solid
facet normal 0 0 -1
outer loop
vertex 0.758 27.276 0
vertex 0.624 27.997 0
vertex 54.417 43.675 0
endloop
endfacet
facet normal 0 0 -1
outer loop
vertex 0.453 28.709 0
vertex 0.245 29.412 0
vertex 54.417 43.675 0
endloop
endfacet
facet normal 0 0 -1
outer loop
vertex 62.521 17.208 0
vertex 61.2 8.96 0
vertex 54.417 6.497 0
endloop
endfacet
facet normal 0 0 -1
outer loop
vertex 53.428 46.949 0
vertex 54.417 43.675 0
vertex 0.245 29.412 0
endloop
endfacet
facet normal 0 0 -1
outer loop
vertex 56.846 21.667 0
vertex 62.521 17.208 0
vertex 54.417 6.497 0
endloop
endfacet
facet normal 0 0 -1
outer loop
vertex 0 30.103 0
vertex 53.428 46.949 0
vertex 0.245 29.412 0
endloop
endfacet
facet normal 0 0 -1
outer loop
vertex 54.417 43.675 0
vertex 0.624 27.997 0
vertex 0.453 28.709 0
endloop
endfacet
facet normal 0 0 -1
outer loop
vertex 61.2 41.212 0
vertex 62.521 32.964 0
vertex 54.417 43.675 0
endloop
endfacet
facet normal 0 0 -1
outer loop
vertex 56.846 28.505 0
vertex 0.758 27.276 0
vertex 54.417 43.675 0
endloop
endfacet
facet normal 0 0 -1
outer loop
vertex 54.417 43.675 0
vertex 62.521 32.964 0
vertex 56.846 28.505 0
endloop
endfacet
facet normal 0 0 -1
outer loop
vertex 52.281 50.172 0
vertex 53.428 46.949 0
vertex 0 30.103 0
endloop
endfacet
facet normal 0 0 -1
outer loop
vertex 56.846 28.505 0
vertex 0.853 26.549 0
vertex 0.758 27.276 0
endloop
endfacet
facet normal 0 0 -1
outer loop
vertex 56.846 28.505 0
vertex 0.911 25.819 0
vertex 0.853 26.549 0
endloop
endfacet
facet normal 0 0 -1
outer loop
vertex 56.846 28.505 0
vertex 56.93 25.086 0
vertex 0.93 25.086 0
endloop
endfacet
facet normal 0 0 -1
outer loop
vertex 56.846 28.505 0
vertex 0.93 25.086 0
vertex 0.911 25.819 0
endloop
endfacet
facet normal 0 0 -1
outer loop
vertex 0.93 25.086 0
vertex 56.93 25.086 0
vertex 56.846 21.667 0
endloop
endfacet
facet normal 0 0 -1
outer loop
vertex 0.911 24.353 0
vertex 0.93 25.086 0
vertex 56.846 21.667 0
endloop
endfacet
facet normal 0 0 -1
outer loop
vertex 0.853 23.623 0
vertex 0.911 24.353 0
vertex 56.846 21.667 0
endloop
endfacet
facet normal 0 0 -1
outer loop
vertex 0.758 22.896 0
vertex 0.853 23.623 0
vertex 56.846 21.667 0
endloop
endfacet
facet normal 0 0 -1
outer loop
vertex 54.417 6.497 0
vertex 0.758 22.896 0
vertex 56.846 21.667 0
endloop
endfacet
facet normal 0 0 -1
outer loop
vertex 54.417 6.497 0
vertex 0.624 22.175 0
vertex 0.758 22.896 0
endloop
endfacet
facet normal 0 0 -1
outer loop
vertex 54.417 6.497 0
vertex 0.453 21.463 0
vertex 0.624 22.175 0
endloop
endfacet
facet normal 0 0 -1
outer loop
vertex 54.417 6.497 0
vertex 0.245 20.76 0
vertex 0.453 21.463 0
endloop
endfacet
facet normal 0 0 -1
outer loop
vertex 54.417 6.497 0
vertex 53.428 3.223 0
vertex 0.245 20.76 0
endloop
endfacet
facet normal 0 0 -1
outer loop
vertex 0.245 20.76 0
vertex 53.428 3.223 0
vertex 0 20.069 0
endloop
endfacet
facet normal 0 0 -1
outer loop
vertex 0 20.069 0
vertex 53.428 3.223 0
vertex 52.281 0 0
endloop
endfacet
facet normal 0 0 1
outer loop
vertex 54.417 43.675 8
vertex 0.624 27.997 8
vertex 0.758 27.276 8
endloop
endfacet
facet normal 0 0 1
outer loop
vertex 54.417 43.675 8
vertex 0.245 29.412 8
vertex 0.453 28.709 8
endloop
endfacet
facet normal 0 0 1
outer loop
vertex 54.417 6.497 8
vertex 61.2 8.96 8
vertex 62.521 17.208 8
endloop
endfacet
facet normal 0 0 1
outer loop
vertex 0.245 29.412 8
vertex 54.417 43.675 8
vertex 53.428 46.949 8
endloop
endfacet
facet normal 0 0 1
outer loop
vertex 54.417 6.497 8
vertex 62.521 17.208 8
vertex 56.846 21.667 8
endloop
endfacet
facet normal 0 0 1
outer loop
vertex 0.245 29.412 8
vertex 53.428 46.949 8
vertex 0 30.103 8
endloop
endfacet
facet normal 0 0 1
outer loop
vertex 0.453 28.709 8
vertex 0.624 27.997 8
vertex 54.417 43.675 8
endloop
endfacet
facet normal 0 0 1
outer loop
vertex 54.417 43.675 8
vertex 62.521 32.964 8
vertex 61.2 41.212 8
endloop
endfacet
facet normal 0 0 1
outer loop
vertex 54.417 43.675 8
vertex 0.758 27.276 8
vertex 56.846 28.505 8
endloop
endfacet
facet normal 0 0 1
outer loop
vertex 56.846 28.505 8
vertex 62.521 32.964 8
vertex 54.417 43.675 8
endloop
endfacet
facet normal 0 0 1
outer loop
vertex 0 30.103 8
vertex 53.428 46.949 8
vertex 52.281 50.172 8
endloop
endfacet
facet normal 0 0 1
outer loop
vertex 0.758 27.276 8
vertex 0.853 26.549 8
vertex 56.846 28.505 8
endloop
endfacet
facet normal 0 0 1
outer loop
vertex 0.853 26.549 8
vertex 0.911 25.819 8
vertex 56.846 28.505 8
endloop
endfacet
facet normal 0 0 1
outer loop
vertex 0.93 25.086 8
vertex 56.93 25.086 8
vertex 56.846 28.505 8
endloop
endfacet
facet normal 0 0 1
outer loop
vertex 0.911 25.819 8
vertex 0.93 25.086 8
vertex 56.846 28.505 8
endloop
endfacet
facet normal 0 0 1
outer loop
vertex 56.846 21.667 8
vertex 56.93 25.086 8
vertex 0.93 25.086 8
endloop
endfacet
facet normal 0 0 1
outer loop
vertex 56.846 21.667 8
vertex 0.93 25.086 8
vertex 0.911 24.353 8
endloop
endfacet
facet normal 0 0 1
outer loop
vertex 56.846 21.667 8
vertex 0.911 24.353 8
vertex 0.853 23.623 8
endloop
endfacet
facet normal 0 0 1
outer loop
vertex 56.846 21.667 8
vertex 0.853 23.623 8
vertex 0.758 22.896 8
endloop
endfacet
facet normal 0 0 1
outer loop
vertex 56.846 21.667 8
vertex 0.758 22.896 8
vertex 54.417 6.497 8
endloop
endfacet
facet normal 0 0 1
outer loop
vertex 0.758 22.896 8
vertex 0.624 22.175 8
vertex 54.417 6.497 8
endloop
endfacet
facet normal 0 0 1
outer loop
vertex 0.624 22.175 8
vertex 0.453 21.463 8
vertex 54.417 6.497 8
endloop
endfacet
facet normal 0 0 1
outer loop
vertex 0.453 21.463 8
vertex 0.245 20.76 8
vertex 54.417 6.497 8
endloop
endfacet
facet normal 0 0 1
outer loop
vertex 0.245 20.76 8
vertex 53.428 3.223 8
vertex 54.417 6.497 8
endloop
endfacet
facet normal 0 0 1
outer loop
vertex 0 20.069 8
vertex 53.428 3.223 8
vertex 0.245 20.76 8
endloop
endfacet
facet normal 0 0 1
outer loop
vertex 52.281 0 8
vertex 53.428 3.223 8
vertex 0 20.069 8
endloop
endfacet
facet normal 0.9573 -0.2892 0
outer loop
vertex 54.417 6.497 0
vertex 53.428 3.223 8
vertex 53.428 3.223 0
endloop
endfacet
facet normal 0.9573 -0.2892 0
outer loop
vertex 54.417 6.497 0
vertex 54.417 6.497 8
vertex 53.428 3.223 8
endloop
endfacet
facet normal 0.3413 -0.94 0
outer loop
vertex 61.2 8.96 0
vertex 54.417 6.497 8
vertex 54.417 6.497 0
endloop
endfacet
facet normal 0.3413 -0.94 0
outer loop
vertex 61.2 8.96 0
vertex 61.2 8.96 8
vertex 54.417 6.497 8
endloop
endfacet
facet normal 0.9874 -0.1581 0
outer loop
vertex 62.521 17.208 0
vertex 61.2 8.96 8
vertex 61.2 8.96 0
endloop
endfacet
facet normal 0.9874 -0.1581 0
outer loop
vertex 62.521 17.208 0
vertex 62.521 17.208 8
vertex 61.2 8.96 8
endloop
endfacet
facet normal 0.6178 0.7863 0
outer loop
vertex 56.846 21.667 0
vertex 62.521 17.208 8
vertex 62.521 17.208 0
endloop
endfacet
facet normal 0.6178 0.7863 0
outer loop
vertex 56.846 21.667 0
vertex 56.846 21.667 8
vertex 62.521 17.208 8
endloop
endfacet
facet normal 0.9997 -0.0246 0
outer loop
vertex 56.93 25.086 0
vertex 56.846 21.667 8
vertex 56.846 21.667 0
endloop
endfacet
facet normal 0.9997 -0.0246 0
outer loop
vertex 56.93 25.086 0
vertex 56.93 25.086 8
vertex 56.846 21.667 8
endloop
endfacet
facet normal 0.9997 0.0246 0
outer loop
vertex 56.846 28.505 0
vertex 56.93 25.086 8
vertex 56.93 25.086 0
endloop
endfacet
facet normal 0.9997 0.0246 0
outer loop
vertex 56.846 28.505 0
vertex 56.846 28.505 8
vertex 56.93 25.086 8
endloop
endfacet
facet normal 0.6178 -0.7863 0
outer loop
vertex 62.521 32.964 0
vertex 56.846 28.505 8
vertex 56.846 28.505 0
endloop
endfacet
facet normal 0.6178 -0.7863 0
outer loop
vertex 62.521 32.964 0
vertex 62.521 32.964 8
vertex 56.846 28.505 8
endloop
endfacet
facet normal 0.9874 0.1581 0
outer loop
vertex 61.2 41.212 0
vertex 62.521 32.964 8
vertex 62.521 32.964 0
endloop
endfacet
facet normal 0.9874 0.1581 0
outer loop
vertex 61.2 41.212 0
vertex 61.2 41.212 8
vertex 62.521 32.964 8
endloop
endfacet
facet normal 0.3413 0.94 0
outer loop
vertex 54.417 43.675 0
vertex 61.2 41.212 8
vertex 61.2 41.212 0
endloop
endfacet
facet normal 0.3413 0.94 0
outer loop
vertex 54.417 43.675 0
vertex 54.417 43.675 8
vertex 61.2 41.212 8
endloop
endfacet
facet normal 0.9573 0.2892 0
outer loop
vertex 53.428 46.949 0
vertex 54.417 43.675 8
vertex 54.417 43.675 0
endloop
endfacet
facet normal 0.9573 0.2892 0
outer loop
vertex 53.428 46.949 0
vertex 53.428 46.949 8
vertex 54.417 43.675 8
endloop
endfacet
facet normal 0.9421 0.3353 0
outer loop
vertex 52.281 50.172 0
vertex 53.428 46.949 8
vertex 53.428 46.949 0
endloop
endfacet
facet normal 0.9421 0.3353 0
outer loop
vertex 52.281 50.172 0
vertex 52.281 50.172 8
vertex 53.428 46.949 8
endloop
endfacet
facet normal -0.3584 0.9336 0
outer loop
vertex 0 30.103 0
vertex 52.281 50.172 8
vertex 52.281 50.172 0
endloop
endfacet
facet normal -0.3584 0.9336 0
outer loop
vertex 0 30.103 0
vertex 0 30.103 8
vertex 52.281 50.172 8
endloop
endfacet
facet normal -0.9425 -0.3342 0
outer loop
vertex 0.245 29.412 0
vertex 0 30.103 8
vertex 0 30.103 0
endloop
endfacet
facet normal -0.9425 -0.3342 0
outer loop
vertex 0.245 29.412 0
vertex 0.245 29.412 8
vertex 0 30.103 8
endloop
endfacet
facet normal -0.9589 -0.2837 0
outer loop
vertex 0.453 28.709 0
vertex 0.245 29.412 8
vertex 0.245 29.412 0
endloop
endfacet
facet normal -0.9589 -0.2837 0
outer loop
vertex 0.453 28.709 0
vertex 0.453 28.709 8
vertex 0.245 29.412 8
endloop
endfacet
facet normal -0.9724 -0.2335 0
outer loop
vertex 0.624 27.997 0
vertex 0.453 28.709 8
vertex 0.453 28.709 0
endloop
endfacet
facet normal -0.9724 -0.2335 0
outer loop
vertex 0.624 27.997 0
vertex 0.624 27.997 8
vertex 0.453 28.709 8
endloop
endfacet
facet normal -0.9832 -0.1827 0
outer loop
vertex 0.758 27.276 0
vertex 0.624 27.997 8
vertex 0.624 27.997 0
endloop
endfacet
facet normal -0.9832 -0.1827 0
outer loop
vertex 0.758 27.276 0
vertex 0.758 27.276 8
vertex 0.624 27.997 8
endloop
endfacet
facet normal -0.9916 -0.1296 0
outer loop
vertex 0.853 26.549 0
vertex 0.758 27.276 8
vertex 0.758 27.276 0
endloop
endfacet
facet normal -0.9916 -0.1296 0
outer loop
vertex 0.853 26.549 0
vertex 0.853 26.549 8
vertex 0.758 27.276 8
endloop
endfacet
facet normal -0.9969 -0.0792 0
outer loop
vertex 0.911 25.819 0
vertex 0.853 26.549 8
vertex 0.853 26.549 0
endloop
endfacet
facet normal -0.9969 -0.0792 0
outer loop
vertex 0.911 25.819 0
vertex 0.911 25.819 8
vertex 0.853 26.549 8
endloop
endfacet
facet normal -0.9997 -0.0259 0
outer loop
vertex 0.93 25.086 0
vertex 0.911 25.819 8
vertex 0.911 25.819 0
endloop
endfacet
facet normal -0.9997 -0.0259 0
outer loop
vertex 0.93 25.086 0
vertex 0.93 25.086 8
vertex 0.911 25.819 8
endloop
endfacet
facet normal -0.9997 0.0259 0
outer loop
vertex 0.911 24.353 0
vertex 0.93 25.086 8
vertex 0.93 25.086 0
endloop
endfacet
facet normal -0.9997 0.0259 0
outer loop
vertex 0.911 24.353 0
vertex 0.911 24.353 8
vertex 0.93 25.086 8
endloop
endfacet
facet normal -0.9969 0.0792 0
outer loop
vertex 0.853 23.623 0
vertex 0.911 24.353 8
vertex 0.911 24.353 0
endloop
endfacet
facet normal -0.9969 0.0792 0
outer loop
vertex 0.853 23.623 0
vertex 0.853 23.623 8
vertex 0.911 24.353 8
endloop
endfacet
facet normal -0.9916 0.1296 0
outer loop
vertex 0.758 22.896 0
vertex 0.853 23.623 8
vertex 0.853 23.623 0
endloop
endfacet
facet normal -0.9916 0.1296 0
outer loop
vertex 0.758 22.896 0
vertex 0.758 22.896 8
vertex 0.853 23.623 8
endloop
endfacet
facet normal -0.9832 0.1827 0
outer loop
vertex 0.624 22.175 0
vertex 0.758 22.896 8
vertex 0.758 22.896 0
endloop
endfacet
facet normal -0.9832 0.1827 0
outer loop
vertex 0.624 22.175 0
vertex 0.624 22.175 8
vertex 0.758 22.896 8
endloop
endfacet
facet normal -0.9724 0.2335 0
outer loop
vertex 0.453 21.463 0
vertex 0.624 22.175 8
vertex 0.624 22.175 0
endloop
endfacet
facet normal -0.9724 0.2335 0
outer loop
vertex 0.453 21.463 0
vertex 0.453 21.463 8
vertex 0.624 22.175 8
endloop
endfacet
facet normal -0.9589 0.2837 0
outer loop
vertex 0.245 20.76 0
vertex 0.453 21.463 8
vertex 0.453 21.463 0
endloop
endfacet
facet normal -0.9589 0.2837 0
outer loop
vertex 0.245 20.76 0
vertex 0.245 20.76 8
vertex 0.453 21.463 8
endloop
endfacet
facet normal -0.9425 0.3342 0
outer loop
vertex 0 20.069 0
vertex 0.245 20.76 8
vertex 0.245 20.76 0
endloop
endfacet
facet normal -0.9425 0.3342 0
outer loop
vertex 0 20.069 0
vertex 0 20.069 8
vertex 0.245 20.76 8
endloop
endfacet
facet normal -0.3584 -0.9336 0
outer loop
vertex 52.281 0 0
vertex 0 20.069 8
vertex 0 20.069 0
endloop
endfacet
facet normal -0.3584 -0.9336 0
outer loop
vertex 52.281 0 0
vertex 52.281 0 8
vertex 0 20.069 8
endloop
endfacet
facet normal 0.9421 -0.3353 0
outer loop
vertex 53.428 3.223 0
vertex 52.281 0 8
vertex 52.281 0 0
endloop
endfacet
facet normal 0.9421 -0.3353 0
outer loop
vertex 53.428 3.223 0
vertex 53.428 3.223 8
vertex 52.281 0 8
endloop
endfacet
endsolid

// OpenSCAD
$fn = 32;

// ----------------------------------------------------------------------
// Gear sector: 2 teeth on 42 degrees
// ----------------------------------------------------------------------

// --- parameters (mm) ---
sector_angle = 42;        // sector angle, degrees
root_r = 70;              // root circle radius
tooth_h = 6;              // tooth height over the root circle
teeth = 2;                // number of teeth on the sector
hub_r = 14;               // hub bore radius
plate_t = 8;              // sector thickness, Z
arc_step = 3;             // sampling step of the root/hub arcs, degrees

tip_r = root_r + tooth_h;  // tip circle radius

profile = [[52.281, 0], [53.428, 3.223], [54.417, 6.497], [61.2, 8.96], [62.521, 17.208], [56.846, 21.667], [56.93, 25.086], [56.846, 28.505], [62.521, 32.964], [61.2, 41.212], [54.417, 43.675], [53.428, 46.949], [52.281, 50.172], [0, 30.103], [0.245, 29.412], [0.453, 28.709], [0.624, 27.997], [0.758, 27.276], [0.853, 26.549], [0.911, 25.819], [0.93, 25.086], [0.911, 24.353], [0.853, 23.623], [0.758, 22.896], [0.624, 22.175], [0.453, 21.463], [0.245, 20.76], [0, 20.069]];  // primary outline, 28 points, counter clockwise

// --- the one profile operation ---
linear_extrude(height = plate_t) polygon(points = profile);
